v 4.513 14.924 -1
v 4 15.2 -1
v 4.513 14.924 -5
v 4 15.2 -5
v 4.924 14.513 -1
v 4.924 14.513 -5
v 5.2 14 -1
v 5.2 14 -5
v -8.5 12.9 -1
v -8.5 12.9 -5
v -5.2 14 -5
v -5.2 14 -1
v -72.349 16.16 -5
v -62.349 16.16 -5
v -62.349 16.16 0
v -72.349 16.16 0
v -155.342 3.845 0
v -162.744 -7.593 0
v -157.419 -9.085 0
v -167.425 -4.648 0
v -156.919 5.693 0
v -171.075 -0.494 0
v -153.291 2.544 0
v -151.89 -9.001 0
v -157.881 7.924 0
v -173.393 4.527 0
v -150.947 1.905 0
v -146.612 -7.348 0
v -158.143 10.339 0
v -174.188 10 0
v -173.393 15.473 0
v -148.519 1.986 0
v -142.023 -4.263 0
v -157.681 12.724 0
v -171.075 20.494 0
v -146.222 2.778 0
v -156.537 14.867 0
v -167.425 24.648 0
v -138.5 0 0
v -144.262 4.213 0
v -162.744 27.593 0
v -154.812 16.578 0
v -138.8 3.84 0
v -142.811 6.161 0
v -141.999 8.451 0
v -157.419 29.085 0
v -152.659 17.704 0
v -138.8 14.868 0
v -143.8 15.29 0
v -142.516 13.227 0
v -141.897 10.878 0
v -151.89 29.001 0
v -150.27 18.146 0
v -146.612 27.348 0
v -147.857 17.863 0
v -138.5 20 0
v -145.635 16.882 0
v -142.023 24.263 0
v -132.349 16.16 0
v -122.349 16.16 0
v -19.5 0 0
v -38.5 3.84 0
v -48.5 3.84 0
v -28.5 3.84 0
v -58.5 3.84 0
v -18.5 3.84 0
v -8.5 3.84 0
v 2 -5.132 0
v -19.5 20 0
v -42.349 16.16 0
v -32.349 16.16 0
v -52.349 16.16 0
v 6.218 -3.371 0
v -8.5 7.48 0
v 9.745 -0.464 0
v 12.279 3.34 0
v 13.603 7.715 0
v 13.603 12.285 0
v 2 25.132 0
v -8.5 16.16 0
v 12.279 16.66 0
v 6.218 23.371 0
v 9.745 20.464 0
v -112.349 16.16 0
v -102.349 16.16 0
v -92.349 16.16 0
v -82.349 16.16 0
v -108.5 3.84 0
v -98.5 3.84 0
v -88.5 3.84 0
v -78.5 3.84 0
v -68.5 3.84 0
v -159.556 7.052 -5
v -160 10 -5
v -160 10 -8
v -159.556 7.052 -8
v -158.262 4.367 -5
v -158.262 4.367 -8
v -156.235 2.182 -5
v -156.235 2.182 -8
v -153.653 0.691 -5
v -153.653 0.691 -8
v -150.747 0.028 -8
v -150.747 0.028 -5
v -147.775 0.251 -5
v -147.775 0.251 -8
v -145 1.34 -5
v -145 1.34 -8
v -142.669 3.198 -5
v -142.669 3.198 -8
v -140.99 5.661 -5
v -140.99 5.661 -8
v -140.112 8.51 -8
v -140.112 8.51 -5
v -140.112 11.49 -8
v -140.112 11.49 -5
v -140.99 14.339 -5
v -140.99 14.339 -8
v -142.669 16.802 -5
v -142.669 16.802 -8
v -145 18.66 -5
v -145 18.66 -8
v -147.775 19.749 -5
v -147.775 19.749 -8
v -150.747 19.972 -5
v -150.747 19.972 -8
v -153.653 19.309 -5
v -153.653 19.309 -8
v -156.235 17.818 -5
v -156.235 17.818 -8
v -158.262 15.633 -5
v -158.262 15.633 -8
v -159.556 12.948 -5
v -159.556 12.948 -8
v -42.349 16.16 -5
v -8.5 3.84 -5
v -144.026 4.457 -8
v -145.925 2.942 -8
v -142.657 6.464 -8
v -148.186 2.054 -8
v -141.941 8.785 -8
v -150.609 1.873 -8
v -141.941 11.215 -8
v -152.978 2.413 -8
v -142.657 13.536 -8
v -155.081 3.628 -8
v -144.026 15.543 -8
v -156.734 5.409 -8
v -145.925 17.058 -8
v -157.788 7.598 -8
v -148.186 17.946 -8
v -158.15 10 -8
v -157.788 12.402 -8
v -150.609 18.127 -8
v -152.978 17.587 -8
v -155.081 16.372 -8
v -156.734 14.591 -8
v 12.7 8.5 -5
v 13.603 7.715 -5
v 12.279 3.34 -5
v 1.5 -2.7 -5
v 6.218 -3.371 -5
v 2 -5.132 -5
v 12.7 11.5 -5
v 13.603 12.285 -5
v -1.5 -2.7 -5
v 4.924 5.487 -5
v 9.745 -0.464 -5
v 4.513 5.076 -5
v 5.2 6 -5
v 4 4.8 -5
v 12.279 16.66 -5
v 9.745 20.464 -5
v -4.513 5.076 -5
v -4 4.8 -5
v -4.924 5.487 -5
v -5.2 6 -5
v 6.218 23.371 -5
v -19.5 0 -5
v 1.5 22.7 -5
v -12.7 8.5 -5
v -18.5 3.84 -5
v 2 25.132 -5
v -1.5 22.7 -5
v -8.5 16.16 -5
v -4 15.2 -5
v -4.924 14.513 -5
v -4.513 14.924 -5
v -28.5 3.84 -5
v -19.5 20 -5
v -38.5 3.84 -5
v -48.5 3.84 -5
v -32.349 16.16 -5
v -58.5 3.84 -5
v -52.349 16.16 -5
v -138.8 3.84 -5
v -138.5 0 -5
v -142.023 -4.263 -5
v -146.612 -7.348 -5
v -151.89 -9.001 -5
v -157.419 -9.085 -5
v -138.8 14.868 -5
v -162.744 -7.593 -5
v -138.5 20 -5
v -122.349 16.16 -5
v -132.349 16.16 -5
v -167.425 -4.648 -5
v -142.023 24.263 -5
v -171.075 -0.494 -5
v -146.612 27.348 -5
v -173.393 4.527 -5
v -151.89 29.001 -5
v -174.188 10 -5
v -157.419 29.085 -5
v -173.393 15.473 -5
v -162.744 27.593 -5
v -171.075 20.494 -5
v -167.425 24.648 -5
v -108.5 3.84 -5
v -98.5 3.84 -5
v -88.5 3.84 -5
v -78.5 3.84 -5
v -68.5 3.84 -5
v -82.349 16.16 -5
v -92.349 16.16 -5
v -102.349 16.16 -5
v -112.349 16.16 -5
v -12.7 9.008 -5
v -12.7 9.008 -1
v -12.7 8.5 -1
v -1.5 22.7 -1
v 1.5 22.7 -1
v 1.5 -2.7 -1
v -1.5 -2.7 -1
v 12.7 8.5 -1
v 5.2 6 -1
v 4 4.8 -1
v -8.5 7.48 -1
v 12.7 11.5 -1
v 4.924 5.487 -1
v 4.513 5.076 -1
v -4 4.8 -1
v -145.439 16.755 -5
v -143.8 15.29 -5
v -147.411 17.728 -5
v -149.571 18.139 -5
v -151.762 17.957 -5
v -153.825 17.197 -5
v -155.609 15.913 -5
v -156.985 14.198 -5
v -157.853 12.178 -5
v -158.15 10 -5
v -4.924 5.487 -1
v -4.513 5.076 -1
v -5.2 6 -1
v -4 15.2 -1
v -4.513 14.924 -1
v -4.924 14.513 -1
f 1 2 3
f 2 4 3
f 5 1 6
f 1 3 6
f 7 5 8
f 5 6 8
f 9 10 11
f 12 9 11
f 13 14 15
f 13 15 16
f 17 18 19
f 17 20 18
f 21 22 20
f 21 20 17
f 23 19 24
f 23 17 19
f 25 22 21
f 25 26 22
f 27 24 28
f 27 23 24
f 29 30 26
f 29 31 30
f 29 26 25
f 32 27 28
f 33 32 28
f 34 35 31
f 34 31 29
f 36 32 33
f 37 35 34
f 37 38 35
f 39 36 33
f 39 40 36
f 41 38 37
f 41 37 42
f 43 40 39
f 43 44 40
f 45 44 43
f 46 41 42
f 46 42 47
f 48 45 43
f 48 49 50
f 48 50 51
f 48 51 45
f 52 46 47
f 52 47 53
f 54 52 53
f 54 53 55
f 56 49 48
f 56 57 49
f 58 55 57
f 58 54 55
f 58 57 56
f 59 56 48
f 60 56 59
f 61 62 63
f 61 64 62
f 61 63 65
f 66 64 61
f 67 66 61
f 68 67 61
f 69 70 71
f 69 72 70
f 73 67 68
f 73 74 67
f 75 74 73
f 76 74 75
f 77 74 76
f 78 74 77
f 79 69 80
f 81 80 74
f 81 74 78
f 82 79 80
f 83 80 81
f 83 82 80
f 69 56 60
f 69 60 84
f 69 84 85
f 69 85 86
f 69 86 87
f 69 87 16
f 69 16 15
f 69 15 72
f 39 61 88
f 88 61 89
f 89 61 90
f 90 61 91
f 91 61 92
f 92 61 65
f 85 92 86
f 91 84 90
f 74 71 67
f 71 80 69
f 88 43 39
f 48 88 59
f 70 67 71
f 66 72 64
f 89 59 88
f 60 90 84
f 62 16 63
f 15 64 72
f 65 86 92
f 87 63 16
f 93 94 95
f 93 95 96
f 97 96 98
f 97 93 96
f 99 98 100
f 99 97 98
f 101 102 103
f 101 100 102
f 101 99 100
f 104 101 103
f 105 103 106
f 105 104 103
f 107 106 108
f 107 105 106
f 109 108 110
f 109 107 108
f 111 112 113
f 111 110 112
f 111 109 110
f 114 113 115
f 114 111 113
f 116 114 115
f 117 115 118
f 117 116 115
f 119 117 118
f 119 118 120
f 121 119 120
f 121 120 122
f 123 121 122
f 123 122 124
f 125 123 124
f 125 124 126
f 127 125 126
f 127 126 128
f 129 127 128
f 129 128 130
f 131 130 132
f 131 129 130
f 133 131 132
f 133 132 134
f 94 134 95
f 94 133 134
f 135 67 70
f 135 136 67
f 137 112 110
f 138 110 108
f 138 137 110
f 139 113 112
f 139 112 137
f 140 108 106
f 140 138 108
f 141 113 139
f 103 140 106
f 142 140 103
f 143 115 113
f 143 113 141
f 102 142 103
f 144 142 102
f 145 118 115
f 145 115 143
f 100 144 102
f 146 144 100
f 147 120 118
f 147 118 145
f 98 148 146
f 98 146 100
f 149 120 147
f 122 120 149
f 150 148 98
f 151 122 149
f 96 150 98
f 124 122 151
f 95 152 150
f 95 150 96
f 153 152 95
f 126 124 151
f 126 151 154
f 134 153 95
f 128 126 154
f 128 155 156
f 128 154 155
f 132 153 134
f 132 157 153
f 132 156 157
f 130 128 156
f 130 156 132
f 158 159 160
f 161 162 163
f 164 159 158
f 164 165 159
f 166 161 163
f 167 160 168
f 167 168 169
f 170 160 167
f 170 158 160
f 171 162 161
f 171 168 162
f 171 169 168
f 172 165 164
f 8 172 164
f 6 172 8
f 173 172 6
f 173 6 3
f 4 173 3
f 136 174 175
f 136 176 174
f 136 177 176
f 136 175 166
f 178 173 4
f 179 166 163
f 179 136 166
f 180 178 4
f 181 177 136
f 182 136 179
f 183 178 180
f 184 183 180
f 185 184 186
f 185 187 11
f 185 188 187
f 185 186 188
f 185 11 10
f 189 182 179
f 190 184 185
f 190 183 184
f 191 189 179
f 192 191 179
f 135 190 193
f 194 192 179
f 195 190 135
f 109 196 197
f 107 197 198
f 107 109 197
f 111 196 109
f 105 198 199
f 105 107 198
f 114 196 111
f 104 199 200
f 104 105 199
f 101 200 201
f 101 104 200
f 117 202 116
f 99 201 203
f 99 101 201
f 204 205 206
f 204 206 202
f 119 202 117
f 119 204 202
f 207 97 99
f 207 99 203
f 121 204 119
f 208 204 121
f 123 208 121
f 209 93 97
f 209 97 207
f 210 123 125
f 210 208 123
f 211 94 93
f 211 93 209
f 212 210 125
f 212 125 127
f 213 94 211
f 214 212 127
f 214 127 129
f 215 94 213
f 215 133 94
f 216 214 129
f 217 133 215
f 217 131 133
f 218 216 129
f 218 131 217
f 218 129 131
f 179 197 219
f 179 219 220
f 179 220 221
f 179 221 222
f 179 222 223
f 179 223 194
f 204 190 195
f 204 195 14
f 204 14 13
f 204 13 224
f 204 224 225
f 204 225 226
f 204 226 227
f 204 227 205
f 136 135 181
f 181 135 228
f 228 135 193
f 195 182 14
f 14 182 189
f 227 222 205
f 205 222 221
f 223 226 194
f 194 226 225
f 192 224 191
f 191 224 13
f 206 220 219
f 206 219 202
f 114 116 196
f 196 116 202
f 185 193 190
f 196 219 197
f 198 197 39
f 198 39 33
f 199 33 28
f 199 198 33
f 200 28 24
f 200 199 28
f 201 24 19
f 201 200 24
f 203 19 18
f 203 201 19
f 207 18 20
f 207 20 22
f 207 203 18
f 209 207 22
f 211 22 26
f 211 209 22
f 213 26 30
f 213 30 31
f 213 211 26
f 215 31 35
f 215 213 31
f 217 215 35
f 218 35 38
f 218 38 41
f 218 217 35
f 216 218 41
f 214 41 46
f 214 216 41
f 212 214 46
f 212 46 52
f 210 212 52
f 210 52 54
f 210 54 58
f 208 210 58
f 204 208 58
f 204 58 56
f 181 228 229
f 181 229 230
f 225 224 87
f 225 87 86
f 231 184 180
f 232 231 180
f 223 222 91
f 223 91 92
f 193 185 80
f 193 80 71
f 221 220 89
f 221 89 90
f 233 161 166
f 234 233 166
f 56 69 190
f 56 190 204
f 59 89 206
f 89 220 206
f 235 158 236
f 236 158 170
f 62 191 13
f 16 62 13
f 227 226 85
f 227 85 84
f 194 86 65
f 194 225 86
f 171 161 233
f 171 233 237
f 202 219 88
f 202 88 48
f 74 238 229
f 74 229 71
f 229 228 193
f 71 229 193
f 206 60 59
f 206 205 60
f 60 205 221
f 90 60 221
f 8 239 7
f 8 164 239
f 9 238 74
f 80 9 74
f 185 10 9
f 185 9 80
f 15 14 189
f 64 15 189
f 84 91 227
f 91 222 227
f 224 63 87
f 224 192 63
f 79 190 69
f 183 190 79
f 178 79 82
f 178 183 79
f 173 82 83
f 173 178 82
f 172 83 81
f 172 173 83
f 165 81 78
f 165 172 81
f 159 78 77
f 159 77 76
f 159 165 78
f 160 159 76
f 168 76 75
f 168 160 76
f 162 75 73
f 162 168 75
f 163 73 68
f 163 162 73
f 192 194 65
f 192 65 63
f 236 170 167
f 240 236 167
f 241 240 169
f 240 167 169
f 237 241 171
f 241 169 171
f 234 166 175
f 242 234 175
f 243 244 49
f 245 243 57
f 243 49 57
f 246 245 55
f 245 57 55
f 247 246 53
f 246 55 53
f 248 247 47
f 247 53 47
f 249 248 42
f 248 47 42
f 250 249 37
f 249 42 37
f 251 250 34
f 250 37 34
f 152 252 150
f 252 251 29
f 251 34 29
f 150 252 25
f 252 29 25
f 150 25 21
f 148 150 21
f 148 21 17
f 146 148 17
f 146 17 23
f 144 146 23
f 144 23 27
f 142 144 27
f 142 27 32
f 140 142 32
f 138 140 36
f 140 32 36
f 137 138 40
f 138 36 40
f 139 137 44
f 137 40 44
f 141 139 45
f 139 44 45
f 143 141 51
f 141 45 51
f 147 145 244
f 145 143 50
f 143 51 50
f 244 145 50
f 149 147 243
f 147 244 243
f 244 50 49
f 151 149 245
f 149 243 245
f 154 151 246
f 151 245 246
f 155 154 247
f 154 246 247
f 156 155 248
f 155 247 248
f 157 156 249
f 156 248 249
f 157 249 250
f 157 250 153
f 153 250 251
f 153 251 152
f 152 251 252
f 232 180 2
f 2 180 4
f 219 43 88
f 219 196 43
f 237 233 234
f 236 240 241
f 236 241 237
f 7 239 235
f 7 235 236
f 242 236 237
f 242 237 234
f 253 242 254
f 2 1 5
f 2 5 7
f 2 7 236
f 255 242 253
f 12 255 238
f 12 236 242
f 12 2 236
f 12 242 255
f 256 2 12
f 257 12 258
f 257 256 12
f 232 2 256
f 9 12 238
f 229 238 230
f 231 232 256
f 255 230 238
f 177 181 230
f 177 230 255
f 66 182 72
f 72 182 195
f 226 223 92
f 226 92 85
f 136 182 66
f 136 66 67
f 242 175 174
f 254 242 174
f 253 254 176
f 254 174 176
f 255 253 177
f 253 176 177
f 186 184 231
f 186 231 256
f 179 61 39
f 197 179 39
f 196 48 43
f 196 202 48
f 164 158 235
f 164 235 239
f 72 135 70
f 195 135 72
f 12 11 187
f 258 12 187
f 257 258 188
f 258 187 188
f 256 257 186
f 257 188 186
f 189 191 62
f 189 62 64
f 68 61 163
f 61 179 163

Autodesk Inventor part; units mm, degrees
ref_plane "YZ Plane" through (0, 0, 0) normal (1, 0, 0) x (0, 1, 0)
ref_plane "XZ Plane" through (0, 0, 0) normal (0, 1, 0) x (-1, 0, 0)
sketch "Szkic1" plane through (0, 0, 0) normal (0, 1, 0) x (-1, 0, 0)
  line L0 (0, 0) -> (150, 0)
  line L1 (150, 0) -> (150, -5)
  line L2 (150, -5) -> (0, -5)
  line L3 (0, -5) -> (0, 0)
  dimension "d0" = 150
  dimension "d1" = 5
extrude "Wyciągnięcie proste1" add sketch "Szkic1" along normal blind 20
sketch "Szkic2" plane through (0, 0, -5) normal (0, 0, -1) x (-1, 0, 0)
  line L0 (0, 0) -> (0, 20) projected
  circle A0 centre (0, 10) radius 2.95
  line L1 (0, 20) -> (-2, 20)
  line L2 (0, 0) -> (-2, 0)
  arc A1 (-2, 20) -> (-2, 0) centre (9.1803, 10) ccw
  line L3 (0, 10) -> (150, 10)
  line L4 (150, 10) -> (138.5, 10)
  line L5 (138.5, 10) -> (170.9, 10)
  line L6 (150, 0) -> (150, 20) projected
  line L7 (138.5, 10) -> (170.9, 10) construction
  line L8 (138.5, 10) -> (170.9, 10)
  line L9 (170.9, 10) -> (170.9, 16.16)
  line L10 (170.9, 16.16) -> (138.5, 16.16)
  line L11 (138.5, 16.16) -> (138.5, 10)
  line L12 (138.5, 10) -> (170.9, 10)
  line L13 (170.9, 10) -> (170.9, 3.84)
  line L14 (170.9, 3.84) -> (138.5, 3.84)
  line L15 (138.5, 3.84) -> (138.5, 10)
  line L16 (0, 0) -> (150, 0) projected
  line L17 (0, 20) -> (150, 20) projected
  arc A2 (138.5, 0) -> (138.5, 20) centre (154.9429, 10) ccw
  point P0 (150, 3.84)
  point P1 (150, 16.16)
  point P2 (0, 7.05)
  point P3 (0, 12.95)
  dimension "d4" = 5.9
  dimension "d5" = 2
  dimension "d6" = 2
  dimension "d7" = 15
  dimension "d8" = 150
  dimension "d9" = 11.5
  dimension "d10" = 32.4
  dimension "d11" = 0
  dimension "d12" = 6.16
  dimension "d13" = 6.16
extrude "Wyciągnięcie proste2" add sketch "Szkic2" against normal blind 5 contours L2 A1 L1 L0 A0 | L16 L6 L14 L13 L9 L10 L17 A2
sketch "Szkic3" plane through (2, 20, -5) normal (0, 0, -1) x (-1, 0, 0)
  arc A0 (2, -7.05) -> (2, -12.95) centre (2, -10) ccw projected
  circle A1 centre (2, -10) radius 2.95
  line L0 (152, -16.16) -> (152, -3.84) projected
  line L1 (152, -16.16) -> (150.5, -16.16)
  line L2 (150.5, -16.16) -> (150.5, -3.84)
  line L3 (150.5, -3.84) -> (152, -3.84)
  line L4 (140.5, -16.16) -> (10.5, -16.16)
  line L5 (10.5, -16.16) -> (10.5, -3.84)
  line L6 (10.5, -3.84) -> (140.5, -3.84)
  line L7 (140.5, -3.84) -> (140.5, -16.16)
  line L8 (150.5, -16.16) -> (150.3, -16.16)
  line L9 (150.3, -16.16) -> (150.3, -3.84)
  line L10 (150.3, -3.84) -> (150.5, -3.84)
  line L11 (152, -16.16) -> (140.5, -16.16)
  line L12 (140.5, -16.16) -> (140.5, -3.84)
  line L13 (140.5, -3.84) -> (152, -3.84)
  line L14 (152, -3.84) -> (152, -16.16)
  point P0 (2, -20)
  dimension "d16" = 1.5
  dimension "d17" = 130
  dimension "d18" = 12.32
  dimension "d21" = 0.2
  dimension "d24" = 11.5
extrude "Wyciągnięcie proste3" cut sketch "Szkic3" against normal through all
sketch "Szkic5" plane through (2, 20, -5) normal (0, 0, -1) x (-1, 0, 0)
  circle A0 centre (2, -10) radius 2.95 projected
  line L0 (2, -10) -> (152, -10)
  line L1 (2, -10) -> (152, -10) construction
  circle A1 centre (152, -10) radius 5.0551
  line L2 (152, -10) -> (145.8, -10)
  line L3 (145.8, -10) -> (145.8, -3.84)
  line L4 (10.5, -3.84) -> (172.9, -3.84) projected
  line L5 (145.8, -3.84) -> (140.8, -3.84)
  line L6 (140.8, -3.84) -> (140.8, -16.16)
  line L7 (172.9, -16.16) -> (10.5, -16.16) projected
  line L8 (145.8, -10) -> (145.8, -16.16)
  line L9 (145.8, -16.16) -> (140.8, -16.16)
  line L10 (10.5, -16.16) -> (10.5, -3.84) projected
  line L11 (10.5, -16.16) -> (44.3489, -3.84)
  line L12 (10.5, -16.16) -> (46.5213, -16.16) construction
  line L13 (44.3489, -3.84) -> (54.3489, -3.84)
  line L14 (10.5, -16.16) -> (20.5, -16.16)
  line L15 (20.5, -16.16) -> (54.3489, -3.84)
  line L16 (20.5, -16.16) -> (30.5, -16.16)
  line L17 (54.3489, -3.84) -> (64.3489, -3.84)
  line L18 (64.3489, -3.84) -> (30.5, -16.16)
  line L19 (44.3489, -3.84) -> (34.3489, -3.84)
  line L20 (10.5, -16.16) -> (0.5, -16.16)
  line L21 (0.5, -16.16) -> (34.3489, -3.84)
  line L22 (40.5, -16.16) -> (74.3489, -3.84)
  line L23 (50.5, -16.16) -> (84.3489, -3.84)
  line L24 (94.3489, -3.84) -> (60.5, -16.16)
  line L25 (30.5, -16.16) -> (64.3489, -3.84)
  line L26 (70.5, -16.16) -> (104.3489, -3.84)
  line L27 (80.5, -16.16) -> (114.3489, -3.84)
  line L28 (124.3489, -3.84) -> (90.5, -16.16)
  line L29 (60.5, -16.16) -> (94.3489, -3.84)
  line L30 (100.5, -16.16) -> (134.3489, -3.84)
  line L31 (110.5, -16.16) -> (144.3489, -3.84)
  line L32 (90.5, -16.16) -> (124.3489, -3.84)
  point P0 (2, -20)
  point P1 (10.5, -12.5203)
  point P2 (60.5, -16.16)
  point P3 (140.8, -5.1317)
  dimension "d25" = 150
  dimension "d26" = 0
  dimension "d27" = 6.2
  dimension "d28" = 5
  dimension "d29" = 20
  dimension "d30" = 10
  dimension "d31" = 10
  dimension "d32" = 10
  dimension "d33" = 10
  dimension "d34" = 10
  dimension "d35" = 10
  dimension "d36" = 10
  dimension "d37" = 10
  dimension "d38" = 10
  dimension "d39" = 10
  dimension "d40" = 10
  dimension "d41" = 10
  dimension "d42" = 10
  dimension "d43" = 10
  dimension "d44" = 10
  dimension "d45" = 10
  dimension "d46" = 10
  dimension "d47" = 10
  dimension "d48" = 10
  dimension "d49" = 10
  dimension "d52" = 10
  dimension "d53" = 10
extrude "Wyciągnięcie proste4" add sketch "Szkic5" against normal blind 5 contours L21 L4 L11 L0 | L0 L11 L10 L21 | L15 L4 L18 L0 | L0 L18 L7 L15 | L22 L4 L23 L0 | L0 L23 L7 L22 | L24 L4 L26 L0 | L0 L26 L7 L24 | L27 L4 L28 L0 | L0 L28 L7 L27 | L30 L4 L6 L31 L0 | L0 L31 L7 L30 | L6 L31 L4 L3 L0 | L0 L8 L7 L6 | L6 L4 L31
sketch "Szkic6" plane through (-138.5, 0, 0) normal (0, 0, 1) x (1, 0, 0)
  circle A0 centre (138.5, 10) radius 2.95 projected
  circle A1 centre (138.5, 10) radius 2.85
  circle A2 centre (138.5, 10) radius 2.95
  point P0 (138.5, 0)
  dimension "d56" = 5.7
extrude "Wyciągnięcie proste5" add sketch "Szkic6" against normal blind 5
ref_plane "Płaszczyzna konstrukcyjna1" through (-138.5, 0, -1) normal (0, 0, 1) x (1, 0, 0)
sketch "Szkic7" plane through (-138.5, 0, -1) normal (0, 0, 1) x (1, 0, 0)
  circle A0 centre (138.5, 10) radius 2.85 projected
  circle A1 centre (138.5, 10) radius 1.25
  circle A2 centre (138.5, 10) radius 2.85
  point P0 (138.5, 0)
  dimension "d60" = 2.5
extrude "Wyciągnięcie proste6" add sketch "Szkic7" against normal blind 1
sketch "Szkic8" plane through (-138.5, 0, 0) normal (0, 0, 1) x (1, 0, 0)
  point P0 (138.5, 0)
sketch "Szkic9" plane through (-138.5, 0, 0) normal (0, 0, 1) x (1, 0, 0)
  circle A0 centre (138.5, 10) radius 1.25 projected
  line L0 (138.5, 10) -> (-11.5, 10)
  line L1 (138.5, 10) -> (288.5, 10) construction
  circle A1 centre (-11.5, 10) radius 8.15
  point P0 (138.5, 0)
  dimension "d63" = 150
  dimension "d64" = 180
  dimension "d65" = 16.3
extrude "Wyciągnięcie proste7" cut sketch "Szkic9" against normal through all contours A1
sketch "Szkic10" plane through (-138.5, 0, 0) normal (0, 0, 1) x (1, 0, 0)
  arc A0 (-5.3, 4.7102) -> (-5.3, 15.2898) centre (-11.5, 10) ccw projected
  circle A1 centre (-11.5, 10) radius 8.15
  line L0 (-32.5164, 20) -> (-2.9538, 20)
  line L1 (-2.9538, 20) -> (-2.9538, 1.85)
  line L2 (-2.9538, 1.85) -> (-32.5164, 1.85)
  line L3 (-32.5164, 1.85) -> (-32.5164, 20)
  point P0 (138.5, 0)
  point P1 (-11.5, 1.85)
  point P2 (-5.3, 15.2898)
extrude "Wyciągnięcie proste8" add sketch "Szkic10" against normal blind 5
sketch "Szkic11" plane through (2, 20, -5) normal (0, 0, -1) x (-1, 0, 0)
  circle A0 centre (152, -10) radius 8.15 projected
  circle A1 centre (152, -10) radius 8.15
  circle A2 centre (152, -10) radius 10
  point P0 (2, -20)
  dimension "d70" = 20
extrude "Wyciągnięcie proste9" add sketch "Szkic11" along normal blind 3
sketch "Szkic12" plane through (2, 20, -5) normal (0, 0, -1) x (-1, 0, 0)
  circle A0 centre (2, -10) radius 1.25 projected
  circle A1 centre (2, -10) radius 5.2
  arc A2 (0, 0) -> (0, -20) centre (11.1803, -10) ccw projected
  line L0 (2, -10) -> (14.7, -10)
  line L1 (2, -10) -> (2, 2.7)
  line L2 (2, -10) -> (-10.7, -10)
  line L3 (2, -10) -> (2, -22.7)
  line L4 (2, -15.2) -> (6, -15.2)
  line L5 (6, -15.2) -> (2, -15.2)
  line L6 (2, -15.2) -> (-2, -15.2)
  line L7 (7.2, -10) -> (7.2, -6)
  line L8 (7.2, -10) -> (7.2, -14)
  line L9 (2, -4.8) -> (-2, -4.8)
  line L10 (2, -4.8) -> (6, -4.8)
  line L11 (-3.2, -10) -> (-3.2, -14)
  line L12 (-3.2, -10) -> (-3.2, -6)
  line L13 (2, -22.7) -> (3.5, -22.7)
  line L14 (3.5, -22.7) -> (2, -22.7)
  line L15 (2, -22.7) -> (0.5, -22.7)
  line L16 (3.5, -22.7) -> (6, -15.2)
  line L17 (0.5, -22.7) -> (-2, -15.2)
  line L18 (14.7, -8.5) -> (7.2, -6)
  line L19 (14.7, -11.5) -> (7.2, -14)
  line L20 (14.7, -8.5) -> (14.7, -10)
  line L21 (0.5, 2.7) -> (-2, -4.8)
  line L22 (3.5, 2.7) -> (6, -4.8)
  line L23 (0.5, 2.7) -> (2, 2.7)
  line L24 (-10.7, -11.5) -> (-3.2, -14)
  line L25 (-10.7, -8.5) -> (-3.2, -6)
  line L26 (-10.7, -11.5) -> (-10.7, -10)
  line L27 (-10.7, -11.5) -> (-10.7, -8.5)
  line L28 (14.7, -11.5) -> (14.7, -8.5)
  line L29 (3.5, 2.7) -> (0.5, 2.7)
  arc A3 (7.2, -6) -> (6, -4.8) centre (5.3194, -6.6806) ccw
  arc A4 (-2, -4.8) -> (-3.2, -6) centre (-1.3194, -6.6806) ccw
  arc A5 (-3.2, -14) -> (-2, -15.2) centre (-1.3194, -13.3194) ccw
  arc A6 (6, -15.2) -> (7.2, -14) centre (5.3194, -13.3194) ccw
  point P0 (2, -20)
  dimension "d73" = 10.4
  dimension "d75" = 12.7
  dimension "d76" = 12.7
  dimension "d77" = 12.7
  dimension "d78" = 12.7
  dimension "d79" = 4
  dimension "d80" = 4
  dimension "d83" = 360
  dimension "d85" = 1.5
  dimension "d86" = 1.5
  dimension "d89" = 360
  dimension "d91" = 2
  dimension "d92" = 2
  dimension "d93" = 2
  dimension "d94" = 2
sketch "Szkic13" plane through (2, 20, -5) normal (0, 0, -1) x (-1, 0, 0)
  line L0 (140.5, 0) -> (0, 0) projected
  line L1 (21.4996, 0) -> (0, 5.1324)
  arc A0 (0, 0) -> (0, -20) centre (11.1803, -10) ccw projected
  line L2 (-3.8197, -10) -> (24.797, -10)
  line L3 (21.4996, -20) -> (0, -25.1324)
  arc A1 (0, 5.1324) -> (0, -25.1324) centre (3.8411, -10) ccw
  line L4 (21.4996, 0) -> (21.4996, -20)
  line L5 (140.5, -20) -> (0, -20) projected
  point P0 (2, -20)
extrude "Wyciągnięcie proste10" add sketch "Szkic13" against normal blind 5 contours L0 A0 L5 L3 A1 L1
extrude "Wyciągnięcie proste11" cut sketch "Szkic12" against normal blind 4 contours L0 L1 A0 | L0 A1 L3 A0 | A0 L3 L0 | A0 L1 A1 L0 | L1 L2 A0 | A0 L2 A1 L1 | L3 A1 L2 A0 | A0 L2 L3 | L8 A6 L4 A1 | L7 L18 L20 L0 | A1 L10 A3 L7 | L0 L28 L19 L8 | L9 L21 L23 L1 | A1 L12 A4 L9 | L1 L29 L22 L10 | L6 A5 L11 A1 | L4 L16 L13 L3 | L3 L15 L17 L6 | L11 L24 A2 L2 | L2 A2 L25 L12 | L2 L27 L25 A2 | A2 L24 L26 L2
ref_plane "Płaszczyzna konstrukcyjna2" through (-22.3, 8.5, -5) normal (-1, 0, 0) x (0, 0, 1)
sketch "Szkic14" plane through (-154.9429, 10, 0) normal (0, 0, 1) x (1, 0, 0)
  circle A0 centre (154.9429, 0) radius 2.85 projected
  circle A1 centre (154.9429, 0) radius 2.85
  point P0 (154.9429, -10)
extrude "Wyciągnięcie proste12" add sketch "Szkic14" against normal blind 1
properties part number "arm_v3"
